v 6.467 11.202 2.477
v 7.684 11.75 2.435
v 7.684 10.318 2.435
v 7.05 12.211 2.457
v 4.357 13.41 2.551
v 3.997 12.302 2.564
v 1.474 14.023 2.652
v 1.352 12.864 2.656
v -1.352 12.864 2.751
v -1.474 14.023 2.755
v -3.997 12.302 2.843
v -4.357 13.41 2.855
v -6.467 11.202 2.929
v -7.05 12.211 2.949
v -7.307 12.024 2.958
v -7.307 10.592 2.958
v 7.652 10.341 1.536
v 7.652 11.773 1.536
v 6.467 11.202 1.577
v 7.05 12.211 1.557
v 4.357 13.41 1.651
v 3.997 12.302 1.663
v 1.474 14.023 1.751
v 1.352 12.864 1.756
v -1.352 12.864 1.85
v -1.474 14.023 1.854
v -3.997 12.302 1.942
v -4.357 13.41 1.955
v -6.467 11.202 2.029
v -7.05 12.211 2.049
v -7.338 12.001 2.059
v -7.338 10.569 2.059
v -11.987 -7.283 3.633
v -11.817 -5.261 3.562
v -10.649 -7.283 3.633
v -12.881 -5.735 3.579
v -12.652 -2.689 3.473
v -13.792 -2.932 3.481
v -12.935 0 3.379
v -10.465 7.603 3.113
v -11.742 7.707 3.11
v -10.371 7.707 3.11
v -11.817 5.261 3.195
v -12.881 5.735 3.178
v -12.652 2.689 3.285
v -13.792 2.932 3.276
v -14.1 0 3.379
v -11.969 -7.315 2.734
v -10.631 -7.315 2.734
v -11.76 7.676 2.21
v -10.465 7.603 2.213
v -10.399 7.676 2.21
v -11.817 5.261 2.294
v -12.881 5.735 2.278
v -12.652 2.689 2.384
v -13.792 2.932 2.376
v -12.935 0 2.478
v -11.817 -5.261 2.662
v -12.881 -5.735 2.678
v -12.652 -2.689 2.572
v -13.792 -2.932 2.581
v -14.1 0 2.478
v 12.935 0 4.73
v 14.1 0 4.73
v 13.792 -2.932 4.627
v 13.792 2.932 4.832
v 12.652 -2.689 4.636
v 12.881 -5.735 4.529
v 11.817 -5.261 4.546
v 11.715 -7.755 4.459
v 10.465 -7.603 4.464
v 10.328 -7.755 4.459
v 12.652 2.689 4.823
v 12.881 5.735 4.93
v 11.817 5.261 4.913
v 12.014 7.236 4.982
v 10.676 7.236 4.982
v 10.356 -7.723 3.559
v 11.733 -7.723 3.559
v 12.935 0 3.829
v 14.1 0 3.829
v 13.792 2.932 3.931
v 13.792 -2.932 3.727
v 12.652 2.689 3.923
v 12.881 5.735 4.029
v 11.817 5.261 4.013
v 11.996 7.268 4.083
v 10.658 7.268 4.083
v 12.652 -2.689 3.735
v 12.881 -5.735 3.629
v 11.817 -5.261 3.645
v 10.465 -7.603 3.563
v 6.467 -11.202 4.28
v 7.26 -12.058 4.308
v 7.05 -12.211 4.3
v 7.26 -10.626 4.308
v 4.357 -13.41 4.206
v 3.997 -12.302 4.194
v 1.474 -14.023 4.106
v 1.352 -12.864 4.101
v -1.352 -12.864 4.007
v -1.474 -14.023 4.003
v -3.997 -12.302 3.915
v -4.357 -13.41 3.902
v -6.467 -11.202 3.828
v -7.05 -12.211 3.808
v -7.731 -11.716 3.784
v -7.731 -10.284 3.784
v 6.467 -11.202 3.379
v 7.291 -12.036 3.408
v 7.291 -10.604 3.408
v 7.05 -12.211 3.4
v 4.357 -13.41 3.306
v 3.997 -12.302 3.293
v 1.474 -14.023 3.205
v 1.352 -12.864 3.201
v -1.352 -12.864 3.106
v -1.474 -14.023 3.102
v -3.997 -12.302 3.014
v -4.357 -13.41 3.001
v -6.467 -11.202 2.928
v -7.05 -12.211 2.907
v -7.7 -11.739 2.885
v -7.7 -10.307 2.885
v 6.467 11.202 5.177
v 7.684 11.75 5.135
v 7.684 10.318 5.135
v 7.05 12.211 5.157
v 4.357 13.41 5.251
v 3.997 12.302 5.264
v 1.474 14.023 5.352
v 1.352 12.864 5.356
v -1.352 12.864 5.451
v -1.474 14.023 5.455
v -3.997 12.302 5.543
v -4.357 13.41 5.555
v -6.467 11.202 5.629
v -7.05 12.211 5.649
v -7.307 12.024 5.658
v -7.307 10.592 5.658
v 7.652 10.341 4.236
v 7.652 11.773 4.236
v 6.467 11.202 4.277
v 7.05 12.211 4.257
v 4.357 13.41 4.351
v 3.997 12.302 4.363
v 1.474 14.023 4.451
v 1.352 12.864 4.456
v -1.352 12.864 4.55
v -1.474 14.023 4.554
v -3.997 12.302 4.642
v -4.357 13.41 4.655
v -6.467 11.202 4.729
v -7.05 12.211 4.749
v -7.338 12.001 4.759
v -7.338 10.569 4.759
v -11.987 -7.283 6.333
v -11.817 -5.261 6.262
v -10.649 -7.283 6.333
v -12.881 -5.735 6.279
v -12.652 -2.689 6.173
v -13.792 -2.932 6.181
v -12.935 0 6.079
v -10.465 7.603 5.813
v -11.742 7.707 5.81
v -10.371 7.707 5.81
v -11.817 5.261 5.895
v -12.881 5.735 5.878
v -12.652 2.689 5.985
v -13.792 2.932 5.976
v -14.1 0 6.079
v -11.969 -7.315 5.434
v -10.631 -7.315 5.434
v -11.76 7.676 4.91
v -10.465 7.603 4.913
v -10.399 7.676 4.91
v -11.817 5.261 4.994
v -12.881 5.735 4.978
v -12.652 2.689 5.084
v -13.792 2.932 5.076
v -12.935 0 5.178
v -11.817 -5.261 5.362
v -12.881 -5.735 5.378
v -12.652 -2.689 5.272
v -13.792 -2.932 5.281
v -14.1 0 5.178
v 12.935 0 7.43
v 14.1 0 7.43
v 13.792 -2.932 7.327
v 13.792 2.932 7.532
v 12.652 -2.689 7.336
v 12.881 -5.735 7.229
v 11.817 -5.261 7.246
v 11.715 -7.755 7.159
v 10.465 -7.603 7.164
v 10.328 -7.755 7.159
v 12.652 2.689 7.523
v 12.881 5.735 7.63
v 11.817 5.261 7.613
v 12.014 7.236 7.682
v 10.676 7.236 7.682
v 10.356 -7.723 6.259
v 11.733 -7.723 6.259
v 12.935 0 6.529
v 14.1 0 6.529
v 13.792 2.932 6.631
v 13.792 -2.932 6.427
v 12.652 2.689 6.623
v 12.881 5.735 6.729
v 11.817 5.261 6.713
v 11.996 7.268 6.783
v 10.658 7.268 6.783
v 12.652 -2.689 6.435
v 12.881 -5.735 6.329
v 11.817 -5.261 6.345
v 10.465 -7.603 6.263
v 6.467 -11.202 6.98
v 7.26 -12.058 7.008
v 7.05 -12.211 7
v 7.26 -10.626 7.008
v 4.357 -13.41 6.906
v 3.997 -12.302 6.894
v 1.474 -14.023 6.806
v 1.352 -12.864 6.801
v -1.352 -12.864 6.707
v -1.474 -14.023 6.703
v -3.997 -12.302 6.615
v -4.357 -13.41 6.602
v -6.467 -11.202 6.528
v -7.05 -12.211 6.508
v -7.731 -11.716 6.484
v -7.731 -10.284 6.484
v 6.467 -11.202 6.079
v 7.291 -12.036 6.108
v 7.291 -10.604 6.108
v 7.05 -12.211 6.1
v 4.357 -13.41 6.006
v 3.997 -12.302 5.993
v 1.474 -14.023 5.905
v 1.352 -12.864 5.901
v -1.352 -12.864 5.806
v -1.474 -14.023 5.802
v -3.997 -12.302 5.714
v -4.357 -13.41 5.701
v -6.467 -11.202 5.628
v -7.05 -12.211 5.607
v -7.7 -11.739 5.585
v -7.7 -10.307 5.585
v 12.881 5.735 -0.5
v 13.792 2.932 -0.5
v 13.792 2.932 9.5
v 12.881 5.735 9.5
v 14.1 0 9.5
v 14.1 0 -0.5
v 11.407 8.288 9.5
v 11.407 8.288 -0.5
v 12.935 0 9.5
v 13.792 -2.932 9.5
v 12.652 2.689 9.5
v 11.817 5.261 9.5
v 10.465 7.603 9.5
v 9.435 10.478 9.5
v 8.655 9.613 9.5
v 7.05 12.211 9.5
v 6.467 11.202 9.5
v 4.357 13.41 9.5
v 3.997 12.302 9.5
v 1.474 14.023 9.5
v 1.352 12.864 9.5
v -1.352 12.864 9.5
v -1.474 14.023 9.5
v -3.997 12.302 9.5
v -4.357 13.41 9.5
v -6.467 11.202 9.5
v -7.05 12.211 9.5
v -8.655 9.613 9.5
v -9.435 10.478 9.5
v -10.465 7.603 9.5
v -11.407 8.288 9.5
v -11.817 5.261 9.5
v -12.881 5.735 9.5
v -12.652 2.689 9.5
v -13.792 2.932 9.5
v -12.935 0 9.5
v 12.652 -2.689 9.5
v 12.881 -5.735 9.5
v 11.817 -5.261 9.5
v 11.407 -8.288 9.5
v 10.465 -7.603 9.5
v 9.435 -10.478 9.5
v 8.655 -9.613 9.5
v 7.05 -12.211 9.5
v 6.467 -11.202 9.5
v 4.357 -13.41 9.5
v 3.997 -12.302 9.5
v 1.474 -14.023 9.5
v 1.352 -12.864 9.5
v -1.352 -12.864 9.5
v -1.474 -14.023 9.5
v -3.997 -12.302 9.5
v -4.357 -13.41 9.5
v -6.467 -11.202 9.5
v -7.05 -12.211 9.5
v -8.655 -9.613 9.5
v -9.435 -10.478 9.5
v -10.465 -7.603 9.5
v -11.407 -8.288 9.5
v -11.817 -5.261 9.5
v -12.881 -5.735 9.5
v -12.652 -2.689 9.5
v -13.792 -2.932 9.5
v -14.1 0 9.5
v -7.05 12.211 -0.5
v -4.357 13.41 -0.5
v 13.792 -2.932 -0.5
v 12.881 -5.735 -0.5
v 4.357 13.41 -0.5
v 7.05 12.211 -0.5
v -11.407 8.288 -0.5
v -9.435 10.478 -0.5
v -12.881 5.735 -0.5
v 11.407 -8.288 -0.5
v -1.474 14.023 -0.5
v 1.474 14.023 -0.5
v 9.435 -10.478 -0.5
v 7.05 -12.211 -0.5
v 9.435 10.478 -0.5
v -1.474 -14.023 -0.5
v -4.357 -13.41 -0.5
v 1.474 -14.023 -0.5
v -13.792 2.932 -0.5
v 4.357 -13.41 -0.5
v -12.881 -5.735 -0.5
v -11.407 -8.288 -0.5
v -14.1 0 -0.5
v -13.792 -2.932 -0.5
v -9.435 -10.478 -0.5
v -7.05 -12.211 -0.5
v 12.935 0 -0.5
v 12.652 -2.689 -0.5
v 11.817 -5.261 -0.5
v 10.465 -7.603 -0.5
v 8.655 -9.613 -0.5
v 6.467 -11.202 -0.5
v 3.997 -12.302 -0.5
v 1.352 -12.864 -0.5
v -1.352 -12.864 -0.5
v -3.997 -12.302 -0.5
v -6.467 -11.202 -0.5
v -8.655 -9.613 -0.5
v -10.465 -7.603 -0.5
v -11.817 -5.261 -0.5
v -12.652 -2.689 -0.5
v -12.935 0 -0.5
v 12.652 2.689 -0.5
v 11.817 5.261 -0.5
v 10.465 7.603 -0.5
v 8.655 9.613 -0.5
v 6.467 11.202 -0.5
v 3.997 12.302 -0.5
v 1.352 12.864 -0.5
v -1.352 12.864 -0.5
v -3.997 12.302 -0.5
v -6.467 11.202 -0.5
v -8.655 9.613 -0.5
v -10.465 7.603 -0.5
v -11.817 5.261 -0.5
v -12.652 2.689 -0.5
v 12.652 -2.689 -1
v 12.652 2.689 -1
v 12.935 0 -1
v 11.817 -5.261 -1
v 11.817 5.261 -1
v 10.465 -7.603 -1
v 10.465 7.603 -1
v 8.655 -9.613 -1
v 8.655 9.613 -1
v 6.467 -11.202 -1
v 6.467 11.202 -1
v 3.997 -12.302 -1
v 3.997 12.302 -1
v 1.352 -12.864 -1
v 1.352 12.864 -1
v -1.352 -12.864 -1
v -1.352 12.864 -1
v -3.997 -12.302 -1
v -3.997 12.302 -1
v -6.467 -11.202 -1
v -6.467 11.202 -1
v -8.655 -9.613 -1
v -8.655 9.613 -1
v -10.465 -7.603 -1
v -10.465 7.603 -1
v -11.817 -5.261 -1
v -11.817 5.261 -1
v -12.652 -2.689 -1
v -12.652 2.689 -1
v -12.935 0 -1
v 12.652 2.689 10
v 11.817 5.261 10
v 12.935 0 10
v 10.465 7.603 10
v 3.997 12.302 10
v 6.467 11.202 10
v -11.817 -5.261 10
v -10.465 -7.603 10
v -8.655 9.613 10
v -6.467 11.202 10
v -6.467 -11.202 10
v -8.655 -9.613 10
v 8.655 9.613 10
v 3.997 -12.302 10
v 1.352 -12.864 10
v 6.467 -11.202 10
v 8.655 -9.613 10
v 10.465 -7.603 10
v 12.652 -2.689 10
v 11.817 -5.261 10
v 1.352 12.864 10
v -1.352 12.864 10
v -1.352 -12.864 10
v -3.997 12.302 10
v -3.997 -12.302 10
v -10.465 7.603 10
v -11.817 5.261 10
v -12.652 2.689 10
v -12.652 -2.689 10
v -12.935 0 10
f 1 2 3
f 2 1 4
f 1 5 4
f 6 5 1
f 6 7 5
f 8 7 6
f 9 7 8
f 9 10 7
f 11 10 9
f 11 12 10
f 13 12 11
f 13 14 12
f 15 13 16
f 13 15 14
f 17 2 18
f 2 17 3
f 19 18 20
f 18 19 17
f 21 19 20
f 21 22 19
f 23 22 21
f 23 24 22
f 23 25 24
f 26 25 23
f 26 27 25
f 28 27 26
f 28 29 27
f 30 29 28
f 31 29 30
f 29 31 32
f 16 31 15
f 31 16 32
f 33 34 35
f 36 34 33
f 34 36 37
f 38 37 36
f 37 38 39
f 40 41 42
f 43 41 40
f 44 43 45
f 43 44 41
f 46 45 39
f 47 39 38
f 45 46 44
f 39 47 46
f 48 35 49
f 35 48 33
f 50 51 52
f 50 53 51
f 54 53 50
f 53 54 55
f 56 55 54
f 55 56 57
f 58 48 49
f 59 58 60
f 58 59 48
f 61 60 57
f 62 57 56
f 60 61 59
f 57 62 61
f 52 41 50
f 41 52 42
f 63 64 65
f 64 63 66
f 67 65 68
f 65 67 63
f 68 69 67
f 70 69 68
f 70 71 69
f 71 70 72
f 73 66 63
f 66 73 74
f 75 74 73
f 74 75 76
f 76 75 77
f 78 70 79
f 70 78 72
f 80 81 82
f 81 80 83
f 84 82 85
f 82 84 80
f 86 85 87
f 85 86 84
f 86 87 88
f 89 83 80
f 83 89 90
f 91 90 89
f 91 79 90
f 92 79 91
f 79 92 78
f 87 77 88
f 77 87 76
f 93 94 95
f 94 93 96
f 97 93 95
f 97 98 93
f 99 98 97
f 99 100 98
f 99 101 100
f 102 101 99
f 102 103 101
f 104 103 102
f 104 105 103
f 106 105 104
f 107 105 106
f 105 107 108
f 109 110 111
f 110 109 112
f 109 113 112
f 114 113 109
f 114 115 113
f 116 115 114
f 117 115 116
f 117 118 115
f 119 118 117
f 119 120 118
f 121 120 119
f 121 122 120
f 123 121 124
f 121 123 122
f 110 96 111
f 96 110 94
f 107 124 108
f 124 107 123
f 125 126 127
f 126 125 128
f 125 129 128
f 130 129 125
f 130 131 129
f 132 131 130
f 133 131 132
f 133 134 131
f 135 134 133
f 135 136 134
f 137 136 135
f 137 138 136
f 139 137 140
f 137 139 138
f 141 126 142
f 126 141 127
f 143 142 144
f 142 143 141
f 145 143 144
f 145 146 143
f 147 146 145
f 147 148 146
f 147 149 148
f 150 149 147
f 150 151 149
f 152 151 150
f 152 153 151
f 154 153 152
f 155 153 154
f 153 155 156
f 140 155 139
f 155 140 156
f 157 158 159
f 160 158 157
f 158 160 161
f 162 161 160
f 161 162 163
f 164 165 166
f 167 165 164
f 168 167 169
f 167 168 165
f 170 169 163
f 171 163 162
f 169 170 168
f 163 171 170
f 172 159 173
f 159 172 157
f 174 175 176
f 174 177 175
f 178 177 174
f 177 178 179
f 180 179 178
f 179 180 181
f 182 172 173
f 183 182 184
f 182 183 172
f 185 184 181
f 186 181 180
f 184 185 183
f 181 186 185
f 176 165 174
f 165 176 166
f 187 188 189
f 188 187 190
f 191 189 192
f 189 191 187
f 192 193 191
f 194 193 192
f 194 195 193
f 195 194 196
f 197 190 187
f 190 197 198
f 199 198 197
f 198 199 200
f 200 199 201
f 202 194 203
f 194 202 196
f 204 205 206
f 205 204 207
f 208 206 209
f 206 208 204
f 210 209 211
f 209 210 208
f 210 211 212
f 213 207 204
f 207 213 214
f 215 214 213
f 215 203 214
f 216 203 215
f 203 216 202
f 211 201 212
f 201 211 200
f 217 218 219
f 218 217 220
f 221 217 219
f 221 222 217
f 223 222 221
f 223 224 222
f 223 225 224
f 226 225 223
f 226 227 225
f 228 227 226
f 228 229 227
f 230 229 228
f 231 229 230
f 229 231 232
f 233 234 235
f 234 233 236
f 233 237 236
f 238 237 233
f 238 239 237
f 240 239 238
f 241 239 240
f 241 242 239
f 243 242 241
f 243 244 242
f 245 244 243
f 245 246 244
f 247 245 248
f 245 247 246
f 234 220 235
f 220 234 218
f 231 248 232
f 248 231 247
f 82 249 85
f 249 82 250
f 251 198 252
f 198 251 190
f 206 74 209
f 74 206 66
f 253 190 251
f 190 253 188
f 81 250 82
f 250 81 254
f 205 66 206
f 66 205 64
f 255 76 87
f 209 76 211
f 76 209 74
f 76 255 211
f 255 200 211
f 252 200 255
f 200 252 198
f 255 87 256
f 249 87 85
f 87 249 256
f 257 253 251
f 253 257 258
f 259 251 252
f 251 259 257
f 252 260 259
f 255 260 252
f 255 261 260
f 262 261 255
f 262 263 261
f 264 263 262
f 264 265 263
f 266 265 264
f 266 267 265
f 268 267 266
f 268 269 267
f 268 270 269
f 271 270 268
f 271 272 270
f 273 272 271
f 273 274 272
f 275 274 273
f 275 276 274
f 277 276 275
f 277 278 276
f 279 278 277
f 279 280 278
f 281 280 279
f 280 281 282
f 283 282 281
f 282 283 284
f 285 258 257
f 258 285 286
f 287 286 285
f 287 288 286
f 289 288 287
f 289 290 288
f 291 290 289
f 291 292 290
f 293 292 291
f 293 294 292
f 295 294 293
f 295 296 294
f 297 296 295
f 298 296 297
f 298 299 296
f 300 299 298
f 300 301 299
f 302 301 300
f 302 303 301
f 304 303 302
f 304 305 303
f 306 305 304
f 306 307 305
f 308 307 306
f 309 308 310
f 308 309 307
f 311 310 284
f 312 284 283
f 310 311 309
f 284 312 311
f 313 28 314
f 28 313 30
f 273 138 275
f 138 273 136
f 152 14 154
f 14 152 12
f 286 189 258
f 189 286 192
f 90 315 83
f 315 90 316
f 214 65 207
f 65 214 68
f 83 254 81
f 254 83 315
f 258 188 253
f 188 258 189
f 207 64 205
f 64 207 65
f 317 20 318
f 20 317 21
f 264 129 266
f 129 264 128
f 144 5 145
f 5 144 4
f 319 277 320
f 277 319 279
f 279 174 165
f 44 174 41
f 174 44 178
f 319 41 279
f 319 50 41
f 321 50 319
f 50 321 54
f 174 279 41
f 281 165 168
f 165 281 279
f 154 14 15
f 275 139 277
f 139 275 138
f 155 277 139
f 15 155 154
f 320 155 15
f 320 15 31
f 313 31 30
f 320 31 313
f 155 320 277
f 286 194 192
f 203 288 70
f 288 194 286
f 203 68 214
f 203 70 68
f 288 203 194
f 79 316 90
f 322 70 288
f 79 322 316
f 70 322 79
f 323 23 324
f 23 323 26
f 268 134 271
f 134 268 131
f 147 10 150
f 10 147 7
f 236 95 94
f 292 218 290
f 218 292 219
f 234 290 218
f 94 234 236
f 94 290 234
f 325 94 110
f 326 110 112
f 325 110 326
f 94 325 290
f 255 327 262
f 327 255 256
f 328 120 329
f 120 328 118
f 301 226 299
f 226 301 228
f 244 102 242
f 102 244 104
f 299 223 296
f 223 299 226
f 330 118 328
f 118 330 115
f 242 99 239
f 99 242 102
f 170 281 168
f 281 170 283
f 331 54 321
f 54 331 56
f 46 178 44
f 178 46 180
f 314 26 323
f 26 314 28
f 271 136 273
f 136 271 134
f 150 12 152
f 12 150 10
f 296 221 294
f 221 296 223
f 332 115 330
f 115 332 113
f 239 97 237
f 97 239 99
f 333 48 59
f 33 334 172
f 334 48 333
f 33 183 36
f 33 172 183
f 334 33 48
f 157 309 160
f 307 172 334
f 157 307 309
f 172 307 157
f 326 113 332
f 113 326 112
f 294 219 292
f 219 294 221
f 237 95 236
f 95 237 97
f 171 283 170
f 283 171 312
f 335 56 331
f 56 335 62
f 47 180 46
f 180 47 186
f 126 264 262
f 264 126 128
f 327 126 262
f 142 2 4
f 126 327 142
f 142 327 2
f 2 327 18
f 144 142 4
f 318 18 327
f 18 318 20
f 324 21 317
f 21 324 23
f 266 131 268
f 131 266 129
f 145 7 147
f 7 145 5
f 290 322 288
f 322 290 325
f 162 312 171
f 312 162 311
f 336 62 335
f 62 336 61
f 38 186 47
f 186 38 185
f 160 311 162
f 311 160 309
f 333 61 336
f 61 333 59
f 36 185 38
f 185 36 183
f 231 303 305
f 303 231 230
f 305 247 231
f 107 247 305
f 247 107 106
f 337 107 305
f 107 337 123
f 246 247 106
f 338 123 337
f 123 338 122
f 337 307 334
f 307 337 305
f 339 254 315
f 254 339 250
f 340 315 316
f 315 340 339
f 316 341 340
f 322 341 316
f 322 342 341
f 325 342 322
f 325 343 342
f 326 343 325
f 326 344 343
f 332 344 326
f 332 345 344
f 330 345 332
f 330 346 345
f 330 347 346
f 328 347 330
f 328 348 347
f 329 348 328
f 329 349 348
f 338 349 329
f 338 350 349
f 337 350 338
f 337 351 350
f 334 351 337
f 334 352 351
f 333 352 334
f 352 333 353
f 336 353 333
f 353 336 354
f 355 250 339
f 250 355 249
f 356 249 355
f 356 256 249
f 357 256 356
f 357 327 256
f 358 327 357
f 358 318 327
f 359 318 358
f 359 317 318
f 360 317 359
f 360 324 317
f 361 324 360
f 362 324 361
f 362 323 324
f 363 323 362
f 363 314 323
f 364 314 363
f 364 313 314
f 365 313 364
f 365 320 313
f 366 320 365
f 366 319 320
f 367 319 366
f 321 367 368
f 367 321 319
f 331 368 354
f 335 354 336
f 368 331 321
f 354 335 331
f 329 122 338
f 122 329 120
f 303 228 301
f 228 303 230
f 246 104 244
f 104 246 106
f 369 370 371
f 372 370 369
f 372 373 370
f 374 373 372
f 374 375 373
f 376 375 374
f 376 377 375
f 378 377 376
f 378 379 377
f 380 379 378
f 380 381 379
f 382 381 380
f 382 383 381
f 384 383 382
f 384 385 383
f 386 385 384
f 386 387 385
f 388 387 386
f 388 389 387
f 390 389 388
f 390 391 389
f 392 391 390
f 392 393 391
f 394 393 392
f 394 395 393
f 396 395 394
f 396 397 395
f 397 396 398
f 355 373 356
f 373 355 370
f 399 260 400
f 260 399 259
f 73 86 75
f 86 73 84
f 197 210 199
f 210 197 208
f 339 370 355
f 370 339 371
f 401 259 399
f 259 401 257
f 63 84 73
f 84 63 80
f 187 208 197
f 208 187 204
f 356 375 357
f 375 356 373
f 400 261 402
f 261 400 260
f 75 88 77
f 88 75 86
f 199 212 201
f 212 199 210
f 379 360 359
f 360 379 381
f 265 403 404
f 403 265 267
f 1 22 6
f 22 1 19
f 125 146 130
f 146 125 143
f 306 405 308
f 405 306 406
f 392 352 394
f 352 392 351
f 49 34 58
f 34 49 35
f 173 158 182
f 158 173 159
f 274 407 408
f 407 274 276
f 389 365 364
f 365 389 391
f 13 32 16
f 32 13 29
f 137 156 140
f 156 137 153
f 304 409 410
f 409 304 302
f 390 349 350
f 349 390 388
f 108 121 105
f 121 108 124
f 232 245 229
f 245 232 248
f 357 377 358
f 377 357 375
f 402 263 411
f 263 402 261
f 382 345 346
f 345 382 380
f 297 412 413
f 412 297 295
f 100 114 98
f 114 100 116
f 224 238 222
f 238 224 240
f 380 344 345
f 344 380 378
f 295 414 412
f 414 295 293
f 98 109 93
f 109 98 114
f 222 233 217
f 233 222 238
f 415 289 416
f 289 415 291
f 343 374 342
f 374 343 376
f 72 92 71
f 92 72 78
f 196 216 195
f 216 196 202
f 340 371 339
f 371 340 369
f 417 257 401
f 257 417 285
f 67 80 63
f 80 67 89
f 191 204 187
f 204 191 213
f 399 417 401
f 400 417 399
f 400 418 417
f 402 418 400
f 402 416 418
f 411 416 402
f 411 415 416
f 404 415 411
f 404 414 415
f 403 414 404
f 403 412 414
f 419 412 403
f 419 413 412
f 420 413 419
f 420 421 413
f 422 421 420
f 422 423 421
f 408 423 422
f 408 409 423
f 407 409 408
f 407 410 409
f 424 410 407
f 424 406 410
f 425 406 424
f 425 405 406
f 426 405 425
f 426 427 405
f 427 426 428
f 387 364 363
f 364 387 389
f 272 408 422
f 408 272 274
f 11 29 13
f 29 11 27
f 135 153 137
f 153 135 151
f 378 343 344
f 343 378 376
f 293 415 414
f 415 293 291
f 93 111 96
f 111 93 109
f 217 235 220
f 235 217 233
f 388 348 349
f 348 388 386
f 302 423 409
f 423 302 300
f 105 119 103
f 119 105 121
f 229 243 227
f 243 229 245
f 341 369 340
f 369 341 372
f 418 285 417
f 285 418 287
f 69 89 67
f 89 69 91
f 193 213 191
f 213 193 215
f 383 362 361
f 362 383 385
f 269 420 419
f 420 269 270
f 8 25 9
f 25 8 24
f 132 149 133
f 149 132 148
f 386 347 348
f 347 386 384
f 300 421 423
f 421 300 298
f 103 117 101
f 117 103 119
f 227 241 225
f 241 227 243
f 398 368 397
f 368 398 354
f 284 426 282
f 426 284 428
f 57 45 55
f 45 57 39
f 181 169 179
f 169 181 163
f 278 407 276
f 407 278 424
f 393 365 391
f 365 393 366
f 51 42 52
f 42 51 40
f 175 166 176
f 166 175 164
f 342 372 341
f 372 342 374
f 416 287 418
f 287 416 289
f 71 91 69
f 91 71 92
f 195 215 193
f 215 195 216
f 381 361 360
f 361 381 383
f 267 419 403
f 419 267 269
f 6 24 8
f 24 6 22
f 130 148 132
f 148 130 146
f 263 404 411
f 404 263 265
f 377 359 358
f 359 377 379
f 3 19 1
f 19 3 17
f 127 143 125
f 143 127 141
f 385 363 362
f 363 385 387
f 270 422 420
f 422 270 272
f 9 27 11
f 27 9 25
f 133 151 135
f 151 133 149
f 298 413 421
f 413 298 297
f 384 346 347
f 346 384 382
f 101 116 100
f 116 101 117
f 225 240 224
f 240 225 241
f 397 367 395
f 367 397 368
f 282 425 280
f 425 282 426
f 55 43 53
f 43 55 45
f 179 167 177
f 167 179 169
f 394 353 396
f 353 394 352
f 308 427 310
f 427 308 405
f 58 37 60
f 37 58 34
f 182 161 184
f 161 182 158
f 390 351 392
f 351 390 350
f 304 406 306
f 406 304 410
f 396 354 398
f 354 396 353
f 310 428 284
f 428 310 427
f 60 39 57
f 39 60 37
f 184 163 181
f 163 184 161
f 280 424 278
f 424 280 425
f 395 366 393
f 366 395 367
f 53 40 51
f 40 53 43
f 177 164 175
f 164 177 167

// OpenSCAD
// 2 Liter Bottle Holder
//
// (c) 2013 Laird Popkin, based on http://www.threadspecs.com/assets/Threadspecs/ISBT-PCO-1881-Finish-3784253-18.pdf.
// Credit to eagleapex for creating and then deleting http://www.thingiverse.com/thing:10489 
// which inspired me to create this.

part="neck"; // "threads" for the part to print, "neck" for the part to subtract from your part
clearance=0.4; // tune to get the right 'fit' for your printer

// Bottle params

bottleID=25.07;
bottleOD=27.4;
bottlePitch=2.7;
bottleHeight=9;
bottleAngle=2;
threadLen=15;

// holder params

holderOD=bottleOD+5;
holderOR=holderOD/2;

// funnel params

funnelOD=100;
funnelWall=2;

// Bottle Computations

threadHeight = bottlePitch/3;
echo("thread height ",threadHeight);
echo("thread depth ",(bottleOD-bottleID)/2);

module bottleNeck() {
	difference() {
		union() {
			translate([0,0,-0.5]) cylinder(r=bottleOD/2+clearance,h=bottleHeight+1);
			}
		union() {
			rotate([0,bottleAngle,0]) translate([-threadLen/2,0,bottleHeight/2]) cube([threadLen,bottleOD,threadHeight]);
			rotate([0,bottleAngle,90]) translate([-threadLen/2,0,bottleHeight/2+bottlePitch/4]) cube([threadLen,bottleOD,threadHeight]);
			rotate([0,bottleAngle,-90]) translate([-threadLen/2,0,bottleHeight/2+bottlePitch*3/4]) cube([threadLen,bottleOD,threadHeight]);
			rotate([0,bottleAngle,180]) translate([-threadLen/2,0,bottleHeight/2+bottlePitch/2]) cube([threadLen,bottleOD,threadHeight]);
			translate([0,0,-bottlePitch]) {
				rotate([0,bottleAngle,0]) translate([-threadLen/2,0,bottleHeight/2]) cube([threadLen,bottleOD,threadHeight]);
				rotate([0,bottleAngle,90]) translate([-threadLen/2,0,bottleHeight/2+bottlePitch/4]) cube([threadLen,bottleOD,threadHeight]);
				rotate([0,bottleAngle,-90]) translate([-threadLen/2,0,bottleHeight/2+bottlePitch*3/4]) cube([threadLen,bottleOD,threadHeight]);
				rotate([0,bottleAngle,180]) translate([-threadLen/2,0,bottleHeight/2+bottlePitch/2]) cube([threadLen,bottleOD,threadHeight]);
				}
			//translate([0,0,bottleHeight/2+bottlePitch/2]) rotate([0,0,90]) cube([10,bottleOD,threadHeight], center=true);
			}
		}
	translate([0,0,-1]) cylinder(r=bottleID/2+clearance,h=bottleHeight+2);
	}

module bottleHolder() {
	difference() {
		cylinder(r=holderOR,h=bottleHeight);
		bottleNeck();
		}
	}

module bottleCap() {
	translate([0,0,1]) bottleHolder();
	cylinder(r=holderOR, h=1);
	}

module funnel() {
	translate([0,0,bottleHeight]) difference() {
		difference() {
			cylinder(r=holderOR, h=funnelWall);
			translate([0,0,-.1]) cylinder(r=bottleID/2, h=funnelWall+.2);
			}
		}
	translate([0,0,bottleHeight+funnelWall]) difference() {
		cylinder(r1=holderOR,r2=funnelOD, h=funnelOD-bottleOD);
		translate([0,0,-.1]) cylinder(r1=bottleID/2,r2=funnelOD-funnelWall, h=funnelOD-bottleOD+.2);
		}
	bottleHolder();
	}

if (part=="threads") bottleHolder();;
if (part=="neck") bottleNeck();
if (part=="funnel") funnel();
if (part=="holder") bottleHolder();
if (part=="cap") bottleCap();
